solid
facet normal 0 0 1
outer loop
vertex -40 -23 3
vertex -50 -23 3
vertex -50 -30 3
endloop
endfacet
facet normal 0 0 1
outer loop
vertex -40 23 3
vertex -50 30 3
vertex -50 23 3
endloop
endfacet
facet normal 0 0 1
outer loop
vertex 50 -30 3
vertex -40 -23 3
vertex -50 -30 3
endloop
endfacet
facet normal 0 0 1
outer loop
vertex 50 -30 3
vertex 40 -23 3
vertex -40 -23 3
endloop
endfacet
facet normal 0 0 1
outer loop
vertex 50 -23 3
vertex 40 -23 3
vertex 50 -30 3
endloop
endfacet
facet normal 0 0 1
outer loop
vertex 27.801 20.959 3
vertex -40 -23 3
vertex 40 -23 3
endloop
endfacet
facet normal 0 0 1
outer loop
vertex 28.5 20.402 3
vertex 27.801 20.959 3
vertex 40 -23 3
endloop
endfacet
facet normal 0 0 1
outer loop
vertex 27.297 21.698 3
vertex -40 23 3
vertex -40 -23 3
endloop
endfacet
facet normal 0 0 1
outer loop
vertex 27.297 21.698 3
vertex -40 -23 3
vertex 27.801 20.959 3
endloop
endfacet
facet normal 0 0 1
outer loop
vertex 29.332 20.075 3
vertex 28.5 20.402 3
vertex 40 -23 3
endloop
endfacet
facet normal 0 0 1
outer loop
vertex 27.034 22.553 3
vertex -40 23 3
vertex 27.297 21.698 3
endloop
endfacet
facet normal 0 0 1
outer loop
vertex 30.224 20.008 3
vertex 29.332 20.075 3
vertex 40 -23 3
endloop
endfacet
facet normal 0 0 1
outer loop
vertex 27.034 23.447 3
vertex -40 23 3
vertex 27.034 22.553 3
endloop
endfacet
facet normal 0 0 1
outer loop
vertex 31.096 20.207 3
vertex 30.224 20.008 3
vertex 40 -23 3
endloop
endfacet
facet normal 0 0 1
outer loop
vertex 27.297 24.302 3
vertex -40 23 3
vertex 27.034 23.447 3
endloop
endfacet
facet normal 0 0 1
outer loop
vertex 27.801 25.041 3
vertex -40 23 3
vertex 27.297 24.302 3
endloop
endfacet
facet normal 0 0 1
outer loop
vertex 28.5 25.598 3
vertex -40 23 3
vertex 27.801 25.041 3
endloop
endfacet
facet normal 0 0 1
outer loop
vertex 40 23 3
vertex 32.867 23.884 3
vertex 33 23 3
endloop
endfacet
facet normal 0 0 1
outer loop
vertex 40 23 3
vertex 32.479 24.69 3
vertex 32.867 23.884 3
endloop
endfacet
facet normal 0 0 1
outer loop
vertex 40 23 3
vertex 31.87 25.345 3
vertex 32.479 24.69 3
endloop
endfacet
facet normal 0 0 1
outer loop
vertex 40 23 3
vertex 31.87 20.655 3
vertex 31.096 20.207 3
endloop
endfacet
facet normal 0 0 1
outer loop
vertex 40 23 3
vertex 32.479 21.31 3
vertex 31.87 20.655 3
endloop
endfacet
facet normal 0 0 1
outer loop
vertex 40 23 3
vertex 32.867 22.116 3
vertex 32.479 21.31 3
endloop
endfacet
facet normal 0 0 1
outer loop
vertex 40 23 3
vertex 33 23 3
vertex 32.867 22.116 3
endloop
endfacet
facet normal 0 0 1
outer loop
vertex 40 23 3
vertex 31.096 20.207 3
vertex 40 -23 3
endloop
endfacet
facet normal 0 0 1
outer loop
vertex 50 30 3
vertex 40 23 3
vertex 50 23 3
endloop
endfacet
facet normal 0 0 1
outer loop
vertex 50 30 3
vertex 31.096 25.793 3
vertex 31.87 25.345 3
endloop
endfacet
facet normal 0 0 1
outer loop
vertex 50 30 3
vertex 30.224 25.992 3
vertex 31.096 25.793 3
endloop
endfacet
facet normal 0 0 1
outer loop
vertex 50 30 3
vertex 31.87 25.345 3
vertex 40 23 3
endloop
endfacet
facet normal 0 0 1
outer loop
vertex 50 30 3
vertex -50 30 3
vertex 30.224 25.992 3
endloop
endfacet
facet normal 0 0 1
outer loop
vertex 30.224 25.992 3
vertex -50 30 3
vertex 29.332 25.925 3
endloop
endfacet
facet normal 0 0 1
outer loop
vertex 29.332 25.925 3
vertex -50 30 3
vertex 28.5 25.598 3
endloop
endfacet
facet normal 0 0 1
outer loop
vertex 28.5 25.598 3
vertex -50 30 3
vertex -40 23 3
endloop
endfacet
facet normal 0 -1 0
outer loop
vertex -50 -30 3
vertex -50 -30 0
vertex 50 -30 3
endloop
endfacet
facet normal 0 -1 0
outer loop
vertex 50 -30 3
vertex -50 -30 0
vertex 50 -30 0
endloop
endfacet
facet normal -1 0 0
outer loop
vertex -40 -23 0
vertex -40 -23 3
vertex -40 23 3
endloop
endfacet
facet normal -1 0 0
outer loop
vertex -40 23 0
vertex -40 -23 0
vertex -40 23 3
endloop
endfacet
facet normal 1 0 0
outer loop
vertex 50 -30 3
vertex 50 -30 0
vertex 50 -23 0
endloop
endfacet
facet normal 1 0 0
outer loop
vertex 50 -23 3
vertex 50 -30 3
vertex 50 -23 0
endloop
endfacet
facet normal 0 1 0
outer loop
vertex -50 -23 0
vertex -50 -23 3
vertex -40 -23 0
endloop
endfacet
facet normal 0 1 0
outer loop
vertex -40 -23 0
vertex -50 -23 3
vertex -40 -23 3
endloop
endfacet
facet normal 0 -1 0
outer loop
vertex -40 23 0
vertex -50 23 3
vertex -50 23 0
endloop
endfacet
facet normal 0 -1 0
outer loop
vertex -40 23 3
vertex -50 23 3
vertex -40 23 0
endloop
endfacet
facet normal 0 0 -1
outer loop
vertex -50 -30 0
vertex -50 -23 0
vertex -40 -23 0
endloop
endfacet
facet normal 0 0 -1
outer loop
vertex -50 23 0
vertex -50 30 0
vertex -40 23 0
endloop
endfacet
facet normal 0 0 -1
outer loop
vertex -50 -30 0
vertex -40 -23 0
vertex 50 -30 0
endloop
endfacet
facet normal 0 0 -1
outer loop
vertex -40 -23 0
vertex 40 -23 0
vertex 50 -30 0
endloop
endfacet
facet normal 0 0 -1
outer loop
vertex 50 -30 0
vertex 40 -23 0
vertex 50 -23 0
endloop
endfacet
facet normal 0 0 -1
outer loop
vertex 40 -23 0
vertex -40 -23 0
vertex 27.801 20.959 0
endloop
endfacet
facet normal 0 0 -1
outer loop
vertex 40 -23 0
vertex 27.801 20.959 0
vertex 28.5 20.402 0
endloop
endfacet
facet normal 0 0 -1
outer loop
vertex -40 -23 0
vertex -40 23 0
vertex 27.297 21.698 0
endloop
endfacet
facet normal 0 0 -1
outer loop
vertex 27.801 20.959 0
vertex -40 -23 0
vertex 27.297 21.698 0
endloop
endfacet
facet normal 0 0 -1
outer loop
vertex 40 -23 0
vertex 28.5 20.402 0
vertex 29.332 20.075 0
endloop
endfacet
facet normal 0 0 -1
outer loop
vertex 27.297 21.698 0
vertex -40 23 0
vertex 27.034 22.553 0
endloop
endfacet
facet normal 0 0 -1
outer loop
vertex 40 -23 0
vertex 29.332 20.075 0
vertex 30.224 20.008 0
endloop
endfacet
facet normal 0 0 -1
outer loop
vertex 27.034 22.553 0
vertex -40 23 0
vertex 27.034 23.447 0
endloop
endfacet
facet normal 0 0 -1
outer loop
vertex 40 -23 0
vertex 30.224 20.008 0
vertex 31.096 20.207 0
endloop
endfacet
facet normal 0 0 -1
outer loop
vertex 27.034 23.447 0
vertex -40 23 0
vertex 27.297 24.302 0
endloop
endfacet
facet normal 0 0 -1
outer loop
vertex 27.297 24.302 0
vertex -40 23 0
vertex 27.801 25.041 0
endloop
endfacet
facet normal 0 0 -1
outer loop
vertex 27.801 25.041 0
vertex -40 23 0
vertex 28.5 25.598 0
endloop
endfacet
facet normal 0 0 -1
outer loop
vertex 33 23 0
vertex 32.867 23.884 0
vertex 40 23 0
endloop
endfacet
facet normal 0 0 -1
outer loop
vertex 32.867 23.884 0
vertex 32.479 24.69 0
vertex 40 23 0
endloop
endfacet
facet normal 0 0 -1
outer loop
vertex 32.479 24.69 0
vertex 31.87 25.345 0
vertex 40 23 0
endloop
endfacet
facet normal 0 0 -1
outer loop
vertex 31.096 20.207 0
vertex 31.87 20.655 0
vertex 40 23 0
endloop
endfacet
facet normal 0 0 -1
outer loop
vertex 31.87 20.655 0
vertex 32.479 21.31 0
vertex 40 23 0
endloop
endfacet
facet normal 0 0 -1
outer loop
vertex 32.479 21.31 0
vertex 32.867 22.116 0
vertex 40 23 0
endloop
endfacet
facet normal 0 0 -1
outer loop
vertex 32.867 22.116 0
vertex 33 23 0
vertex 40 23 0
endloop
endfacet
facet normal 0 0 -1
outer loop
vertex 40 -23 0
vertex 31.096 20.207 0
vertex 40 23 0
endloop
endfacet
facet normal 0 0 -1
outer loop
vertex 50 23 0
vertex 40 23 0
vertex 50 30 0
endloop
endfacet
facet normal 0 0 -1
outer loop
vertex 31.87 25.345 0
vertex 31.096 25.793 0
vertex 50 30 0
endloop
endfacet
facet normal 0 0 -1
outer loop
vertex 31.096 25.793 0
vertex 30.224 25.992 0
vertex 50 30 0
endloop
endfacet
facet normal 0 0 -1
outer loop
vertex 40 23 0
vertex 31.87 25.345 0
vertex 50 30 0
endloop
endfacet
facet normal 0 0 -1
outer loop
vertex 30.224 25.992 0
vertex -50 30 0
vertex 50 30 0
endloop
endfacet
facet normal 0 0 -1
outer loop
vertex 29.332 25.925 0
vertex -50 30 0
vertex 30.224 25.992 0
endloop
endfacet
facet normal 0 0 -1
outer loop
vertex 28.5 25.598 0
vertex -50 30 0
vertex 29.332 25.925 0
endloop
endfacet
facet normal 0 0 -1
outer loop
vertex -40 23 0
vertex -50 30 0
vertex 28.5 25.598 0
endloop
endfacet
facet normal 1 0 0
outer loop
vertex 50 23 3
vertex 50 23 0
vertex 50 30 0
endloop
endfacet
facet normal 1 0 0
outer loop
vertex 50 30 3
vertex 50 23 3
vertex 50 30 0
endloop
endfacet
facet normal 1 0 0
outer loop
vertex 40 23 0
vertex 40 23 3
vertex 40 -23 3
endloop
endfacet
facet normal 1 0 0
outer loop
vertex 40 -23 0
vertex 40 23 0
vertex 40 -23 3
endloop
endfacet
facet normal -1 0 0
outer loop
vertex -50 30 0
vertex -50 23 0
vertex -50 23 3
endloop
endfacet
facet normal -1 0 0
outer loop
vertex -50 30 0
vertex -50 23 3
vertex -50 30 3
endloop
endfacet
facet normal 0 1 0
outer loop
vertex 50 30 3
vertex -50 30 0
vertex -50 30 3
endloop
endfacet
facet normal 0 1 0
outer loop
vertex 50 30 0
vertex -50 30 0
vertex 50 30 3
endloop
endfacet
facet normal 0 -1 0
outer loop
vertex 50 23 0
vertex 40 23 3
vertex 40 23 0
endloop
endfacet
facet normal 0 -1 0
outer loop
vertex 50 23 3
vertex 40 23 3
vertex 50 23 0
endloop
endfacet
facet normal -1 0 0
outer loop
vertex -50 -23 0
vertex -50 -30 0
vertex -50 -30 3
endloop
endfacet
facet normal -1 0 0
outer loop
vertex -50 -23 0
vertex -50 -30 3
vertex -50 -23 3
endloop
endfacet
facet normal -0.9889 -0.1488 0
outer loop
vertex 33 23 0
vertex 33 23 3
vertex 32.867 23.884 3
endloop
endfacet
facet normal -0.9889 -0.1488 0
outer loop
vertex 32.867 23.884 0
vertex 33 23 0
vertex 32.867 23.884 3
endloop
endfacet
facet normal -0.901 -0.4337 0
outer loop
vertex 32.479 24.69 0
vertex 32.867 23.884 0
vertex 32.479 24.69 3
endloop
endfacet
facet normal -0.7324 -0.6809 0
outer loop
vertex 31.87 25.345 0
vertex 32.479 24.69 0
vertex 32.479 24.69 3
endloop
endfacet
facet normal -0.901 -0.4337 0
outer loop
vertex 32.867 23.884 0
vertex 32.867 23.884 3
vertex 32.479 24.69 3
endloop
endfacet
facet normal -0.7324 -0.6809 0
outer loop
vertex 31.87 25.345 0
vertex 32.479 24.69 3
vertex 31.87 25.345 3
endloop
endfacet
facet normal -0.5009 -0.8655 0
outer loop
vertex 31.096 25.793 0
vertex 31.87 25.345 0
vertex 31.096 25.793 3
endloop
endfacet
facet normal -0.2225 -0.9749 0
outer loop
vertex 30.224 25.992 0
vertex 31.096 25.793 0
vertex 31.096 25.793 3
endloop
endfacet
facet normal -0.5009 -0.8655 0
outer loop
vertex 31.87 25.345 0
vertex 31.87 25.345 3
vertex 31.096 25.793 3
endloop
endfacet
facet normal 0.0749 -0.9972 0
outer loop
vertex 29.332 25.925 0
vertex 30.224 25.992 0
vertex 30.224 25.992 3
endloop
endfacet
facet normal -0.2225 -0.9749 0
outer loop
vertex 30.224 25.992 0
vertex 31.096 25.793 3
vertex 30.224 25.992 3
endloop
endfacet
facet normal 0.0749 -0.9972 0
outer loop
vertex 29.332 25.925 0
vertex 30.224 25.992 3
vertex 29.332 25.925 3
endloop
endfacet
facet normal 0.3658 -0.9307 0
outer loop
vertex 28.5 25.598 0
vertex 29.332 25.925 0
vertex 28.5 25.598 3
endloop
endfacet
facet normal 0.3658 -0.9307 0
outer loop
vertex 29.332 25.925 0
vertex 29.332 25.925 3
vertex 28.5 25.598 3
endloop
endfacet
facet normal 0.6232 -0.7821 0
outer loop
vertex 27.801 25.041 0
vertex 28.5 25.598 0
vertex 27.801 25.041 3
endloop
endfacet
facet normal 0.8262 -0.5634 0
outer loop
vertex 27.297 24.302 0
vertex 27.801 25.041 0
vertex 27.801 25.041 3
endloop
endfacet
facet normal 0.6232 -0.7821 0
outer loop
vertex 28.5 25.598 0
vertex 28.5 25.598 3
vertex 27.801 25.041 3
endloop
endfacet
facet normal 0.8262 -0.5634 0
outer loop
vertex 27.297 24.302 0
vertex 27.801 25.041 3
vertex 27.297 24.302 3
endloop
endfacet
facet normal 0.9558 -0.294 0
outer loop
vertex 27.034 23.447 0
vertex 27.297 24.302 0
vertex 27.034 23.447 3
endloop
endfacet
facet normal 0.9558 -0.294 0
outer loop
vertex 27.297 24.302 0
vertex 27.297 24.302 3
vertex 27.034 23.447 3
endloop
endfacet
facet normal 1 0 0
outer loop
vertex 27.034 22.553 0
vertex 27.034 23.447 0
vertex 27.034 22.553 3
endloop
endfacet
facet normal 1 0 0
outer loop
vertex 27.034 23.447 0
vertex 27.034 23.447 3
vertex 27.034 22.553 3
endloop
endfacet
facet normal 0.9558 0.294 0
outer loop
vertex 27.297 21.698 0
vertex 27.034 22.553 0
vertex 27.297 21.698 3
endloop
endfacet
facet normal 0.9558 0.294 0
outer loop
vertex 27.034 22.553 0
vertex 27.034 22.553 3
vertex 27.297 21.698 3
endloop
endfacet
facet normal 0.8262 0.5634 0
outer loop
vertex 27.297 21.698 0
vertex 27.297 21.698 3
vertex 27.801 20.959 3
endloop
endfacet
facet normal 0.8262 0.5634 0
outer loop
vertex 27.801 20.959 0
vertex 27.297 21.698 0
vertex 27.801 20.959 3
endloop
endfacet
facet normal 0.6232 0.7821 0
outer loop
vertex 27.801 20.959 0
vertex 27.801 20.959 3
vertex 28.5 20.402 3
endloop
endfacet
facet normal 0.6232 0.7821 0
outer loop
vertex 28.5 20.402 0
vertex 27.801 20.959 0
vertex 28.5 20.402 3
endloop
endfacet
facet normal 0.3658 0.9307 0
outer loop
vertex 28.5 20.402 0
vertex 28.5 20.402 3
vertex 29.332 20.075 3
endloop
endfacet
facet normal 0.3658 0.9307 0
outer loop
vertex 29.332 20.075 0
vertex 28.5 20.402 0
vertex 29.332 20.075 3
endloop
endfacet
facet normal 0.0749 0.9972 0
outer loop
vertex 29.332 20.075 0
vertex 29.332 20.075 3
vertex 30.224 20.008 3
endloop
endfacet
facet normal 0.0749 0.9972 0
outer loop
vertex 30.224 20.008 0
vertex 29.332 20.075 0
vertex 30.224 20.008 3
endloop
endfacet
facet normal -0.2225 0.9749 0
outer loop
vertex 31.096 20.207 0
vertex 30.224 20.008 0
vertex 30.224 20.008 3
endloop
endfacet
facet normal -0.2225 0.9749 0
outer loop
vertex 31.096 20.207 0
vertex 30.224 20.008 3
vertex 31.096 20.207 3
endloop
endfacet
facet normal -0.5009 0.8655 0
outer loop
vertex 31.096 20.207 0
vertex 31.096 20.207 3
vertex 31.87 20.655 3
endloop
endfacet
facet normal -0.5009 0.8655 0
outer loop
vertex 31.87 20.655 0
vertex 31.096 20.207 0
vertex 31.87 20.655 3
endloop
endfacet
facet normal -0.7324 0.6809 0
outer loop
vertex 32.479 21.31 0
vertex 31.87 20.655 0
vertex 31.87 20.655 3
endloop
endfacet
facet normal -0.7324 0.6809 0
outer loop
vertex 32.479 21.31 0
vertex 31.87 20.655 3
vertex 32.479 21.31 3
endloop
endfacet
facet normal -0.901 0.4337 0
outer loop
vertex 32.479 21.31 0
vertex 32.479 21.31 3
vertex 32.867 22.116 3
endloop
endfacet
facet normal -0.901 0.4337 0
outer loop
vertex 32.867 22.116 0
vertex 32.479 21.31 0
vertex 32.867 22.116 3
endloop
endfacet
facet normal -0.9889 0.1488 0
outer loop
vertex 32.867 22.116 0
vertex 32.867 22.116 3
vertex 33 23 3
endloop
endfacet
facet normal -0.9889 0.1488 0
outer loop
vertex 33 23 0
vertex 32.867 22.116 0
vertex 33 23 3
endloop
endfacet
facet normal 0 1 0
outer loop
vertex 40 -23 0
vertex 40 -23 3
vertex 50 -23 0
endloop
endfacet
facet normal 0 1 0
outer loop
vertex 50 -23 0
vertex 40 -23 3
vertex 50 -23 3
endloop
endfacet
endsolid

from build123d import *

# Parameters (mm, degrees)
F0_W     = 100
F0_H     = 60
F1_DEPTH = 3
F2_W     = 10
F2_H     = 23
F3_DEPTH = 3.001
F4_R     = 3
F5_DEPTH = 3.001


with BuildPart() as f1:
    # F0 (on Top) → F1 (new body)
    with BuildSketch(Plane.XY):
        Rectangle(F0_W, F0_H)
    extrude(amount=F1_DEPTH)

    # F2 (on face) → F3 (cut, through all)
    with BuildSketch(Plane.XY.offset(3)):
        with Locations((-45, 11.5)):
            Rectangle(F2_W, F2_H)
        with Locations((-45, -11.5)):
            Rectangle(F2_W, F2_H)
        with Locations((45, 11.5)):
            Rectangle(F2_W, F2_H)
        with Locations((45, -11.5)):
            Rectangle(F2_W, F2_H)
    extrude(amount=-F3_DEPTH, mode=Mode.SUBTRACT)

    # F4 (on face) → F5 (cut, through all)
    with BuildSketch(Plane.XY.offset(3)):
        with Locations((30, 23)):
            Circle(F4_R)
    extrude(amount=-F5_DEPTH, mode=Mode.SUBTRACT)


solid = f1.part
